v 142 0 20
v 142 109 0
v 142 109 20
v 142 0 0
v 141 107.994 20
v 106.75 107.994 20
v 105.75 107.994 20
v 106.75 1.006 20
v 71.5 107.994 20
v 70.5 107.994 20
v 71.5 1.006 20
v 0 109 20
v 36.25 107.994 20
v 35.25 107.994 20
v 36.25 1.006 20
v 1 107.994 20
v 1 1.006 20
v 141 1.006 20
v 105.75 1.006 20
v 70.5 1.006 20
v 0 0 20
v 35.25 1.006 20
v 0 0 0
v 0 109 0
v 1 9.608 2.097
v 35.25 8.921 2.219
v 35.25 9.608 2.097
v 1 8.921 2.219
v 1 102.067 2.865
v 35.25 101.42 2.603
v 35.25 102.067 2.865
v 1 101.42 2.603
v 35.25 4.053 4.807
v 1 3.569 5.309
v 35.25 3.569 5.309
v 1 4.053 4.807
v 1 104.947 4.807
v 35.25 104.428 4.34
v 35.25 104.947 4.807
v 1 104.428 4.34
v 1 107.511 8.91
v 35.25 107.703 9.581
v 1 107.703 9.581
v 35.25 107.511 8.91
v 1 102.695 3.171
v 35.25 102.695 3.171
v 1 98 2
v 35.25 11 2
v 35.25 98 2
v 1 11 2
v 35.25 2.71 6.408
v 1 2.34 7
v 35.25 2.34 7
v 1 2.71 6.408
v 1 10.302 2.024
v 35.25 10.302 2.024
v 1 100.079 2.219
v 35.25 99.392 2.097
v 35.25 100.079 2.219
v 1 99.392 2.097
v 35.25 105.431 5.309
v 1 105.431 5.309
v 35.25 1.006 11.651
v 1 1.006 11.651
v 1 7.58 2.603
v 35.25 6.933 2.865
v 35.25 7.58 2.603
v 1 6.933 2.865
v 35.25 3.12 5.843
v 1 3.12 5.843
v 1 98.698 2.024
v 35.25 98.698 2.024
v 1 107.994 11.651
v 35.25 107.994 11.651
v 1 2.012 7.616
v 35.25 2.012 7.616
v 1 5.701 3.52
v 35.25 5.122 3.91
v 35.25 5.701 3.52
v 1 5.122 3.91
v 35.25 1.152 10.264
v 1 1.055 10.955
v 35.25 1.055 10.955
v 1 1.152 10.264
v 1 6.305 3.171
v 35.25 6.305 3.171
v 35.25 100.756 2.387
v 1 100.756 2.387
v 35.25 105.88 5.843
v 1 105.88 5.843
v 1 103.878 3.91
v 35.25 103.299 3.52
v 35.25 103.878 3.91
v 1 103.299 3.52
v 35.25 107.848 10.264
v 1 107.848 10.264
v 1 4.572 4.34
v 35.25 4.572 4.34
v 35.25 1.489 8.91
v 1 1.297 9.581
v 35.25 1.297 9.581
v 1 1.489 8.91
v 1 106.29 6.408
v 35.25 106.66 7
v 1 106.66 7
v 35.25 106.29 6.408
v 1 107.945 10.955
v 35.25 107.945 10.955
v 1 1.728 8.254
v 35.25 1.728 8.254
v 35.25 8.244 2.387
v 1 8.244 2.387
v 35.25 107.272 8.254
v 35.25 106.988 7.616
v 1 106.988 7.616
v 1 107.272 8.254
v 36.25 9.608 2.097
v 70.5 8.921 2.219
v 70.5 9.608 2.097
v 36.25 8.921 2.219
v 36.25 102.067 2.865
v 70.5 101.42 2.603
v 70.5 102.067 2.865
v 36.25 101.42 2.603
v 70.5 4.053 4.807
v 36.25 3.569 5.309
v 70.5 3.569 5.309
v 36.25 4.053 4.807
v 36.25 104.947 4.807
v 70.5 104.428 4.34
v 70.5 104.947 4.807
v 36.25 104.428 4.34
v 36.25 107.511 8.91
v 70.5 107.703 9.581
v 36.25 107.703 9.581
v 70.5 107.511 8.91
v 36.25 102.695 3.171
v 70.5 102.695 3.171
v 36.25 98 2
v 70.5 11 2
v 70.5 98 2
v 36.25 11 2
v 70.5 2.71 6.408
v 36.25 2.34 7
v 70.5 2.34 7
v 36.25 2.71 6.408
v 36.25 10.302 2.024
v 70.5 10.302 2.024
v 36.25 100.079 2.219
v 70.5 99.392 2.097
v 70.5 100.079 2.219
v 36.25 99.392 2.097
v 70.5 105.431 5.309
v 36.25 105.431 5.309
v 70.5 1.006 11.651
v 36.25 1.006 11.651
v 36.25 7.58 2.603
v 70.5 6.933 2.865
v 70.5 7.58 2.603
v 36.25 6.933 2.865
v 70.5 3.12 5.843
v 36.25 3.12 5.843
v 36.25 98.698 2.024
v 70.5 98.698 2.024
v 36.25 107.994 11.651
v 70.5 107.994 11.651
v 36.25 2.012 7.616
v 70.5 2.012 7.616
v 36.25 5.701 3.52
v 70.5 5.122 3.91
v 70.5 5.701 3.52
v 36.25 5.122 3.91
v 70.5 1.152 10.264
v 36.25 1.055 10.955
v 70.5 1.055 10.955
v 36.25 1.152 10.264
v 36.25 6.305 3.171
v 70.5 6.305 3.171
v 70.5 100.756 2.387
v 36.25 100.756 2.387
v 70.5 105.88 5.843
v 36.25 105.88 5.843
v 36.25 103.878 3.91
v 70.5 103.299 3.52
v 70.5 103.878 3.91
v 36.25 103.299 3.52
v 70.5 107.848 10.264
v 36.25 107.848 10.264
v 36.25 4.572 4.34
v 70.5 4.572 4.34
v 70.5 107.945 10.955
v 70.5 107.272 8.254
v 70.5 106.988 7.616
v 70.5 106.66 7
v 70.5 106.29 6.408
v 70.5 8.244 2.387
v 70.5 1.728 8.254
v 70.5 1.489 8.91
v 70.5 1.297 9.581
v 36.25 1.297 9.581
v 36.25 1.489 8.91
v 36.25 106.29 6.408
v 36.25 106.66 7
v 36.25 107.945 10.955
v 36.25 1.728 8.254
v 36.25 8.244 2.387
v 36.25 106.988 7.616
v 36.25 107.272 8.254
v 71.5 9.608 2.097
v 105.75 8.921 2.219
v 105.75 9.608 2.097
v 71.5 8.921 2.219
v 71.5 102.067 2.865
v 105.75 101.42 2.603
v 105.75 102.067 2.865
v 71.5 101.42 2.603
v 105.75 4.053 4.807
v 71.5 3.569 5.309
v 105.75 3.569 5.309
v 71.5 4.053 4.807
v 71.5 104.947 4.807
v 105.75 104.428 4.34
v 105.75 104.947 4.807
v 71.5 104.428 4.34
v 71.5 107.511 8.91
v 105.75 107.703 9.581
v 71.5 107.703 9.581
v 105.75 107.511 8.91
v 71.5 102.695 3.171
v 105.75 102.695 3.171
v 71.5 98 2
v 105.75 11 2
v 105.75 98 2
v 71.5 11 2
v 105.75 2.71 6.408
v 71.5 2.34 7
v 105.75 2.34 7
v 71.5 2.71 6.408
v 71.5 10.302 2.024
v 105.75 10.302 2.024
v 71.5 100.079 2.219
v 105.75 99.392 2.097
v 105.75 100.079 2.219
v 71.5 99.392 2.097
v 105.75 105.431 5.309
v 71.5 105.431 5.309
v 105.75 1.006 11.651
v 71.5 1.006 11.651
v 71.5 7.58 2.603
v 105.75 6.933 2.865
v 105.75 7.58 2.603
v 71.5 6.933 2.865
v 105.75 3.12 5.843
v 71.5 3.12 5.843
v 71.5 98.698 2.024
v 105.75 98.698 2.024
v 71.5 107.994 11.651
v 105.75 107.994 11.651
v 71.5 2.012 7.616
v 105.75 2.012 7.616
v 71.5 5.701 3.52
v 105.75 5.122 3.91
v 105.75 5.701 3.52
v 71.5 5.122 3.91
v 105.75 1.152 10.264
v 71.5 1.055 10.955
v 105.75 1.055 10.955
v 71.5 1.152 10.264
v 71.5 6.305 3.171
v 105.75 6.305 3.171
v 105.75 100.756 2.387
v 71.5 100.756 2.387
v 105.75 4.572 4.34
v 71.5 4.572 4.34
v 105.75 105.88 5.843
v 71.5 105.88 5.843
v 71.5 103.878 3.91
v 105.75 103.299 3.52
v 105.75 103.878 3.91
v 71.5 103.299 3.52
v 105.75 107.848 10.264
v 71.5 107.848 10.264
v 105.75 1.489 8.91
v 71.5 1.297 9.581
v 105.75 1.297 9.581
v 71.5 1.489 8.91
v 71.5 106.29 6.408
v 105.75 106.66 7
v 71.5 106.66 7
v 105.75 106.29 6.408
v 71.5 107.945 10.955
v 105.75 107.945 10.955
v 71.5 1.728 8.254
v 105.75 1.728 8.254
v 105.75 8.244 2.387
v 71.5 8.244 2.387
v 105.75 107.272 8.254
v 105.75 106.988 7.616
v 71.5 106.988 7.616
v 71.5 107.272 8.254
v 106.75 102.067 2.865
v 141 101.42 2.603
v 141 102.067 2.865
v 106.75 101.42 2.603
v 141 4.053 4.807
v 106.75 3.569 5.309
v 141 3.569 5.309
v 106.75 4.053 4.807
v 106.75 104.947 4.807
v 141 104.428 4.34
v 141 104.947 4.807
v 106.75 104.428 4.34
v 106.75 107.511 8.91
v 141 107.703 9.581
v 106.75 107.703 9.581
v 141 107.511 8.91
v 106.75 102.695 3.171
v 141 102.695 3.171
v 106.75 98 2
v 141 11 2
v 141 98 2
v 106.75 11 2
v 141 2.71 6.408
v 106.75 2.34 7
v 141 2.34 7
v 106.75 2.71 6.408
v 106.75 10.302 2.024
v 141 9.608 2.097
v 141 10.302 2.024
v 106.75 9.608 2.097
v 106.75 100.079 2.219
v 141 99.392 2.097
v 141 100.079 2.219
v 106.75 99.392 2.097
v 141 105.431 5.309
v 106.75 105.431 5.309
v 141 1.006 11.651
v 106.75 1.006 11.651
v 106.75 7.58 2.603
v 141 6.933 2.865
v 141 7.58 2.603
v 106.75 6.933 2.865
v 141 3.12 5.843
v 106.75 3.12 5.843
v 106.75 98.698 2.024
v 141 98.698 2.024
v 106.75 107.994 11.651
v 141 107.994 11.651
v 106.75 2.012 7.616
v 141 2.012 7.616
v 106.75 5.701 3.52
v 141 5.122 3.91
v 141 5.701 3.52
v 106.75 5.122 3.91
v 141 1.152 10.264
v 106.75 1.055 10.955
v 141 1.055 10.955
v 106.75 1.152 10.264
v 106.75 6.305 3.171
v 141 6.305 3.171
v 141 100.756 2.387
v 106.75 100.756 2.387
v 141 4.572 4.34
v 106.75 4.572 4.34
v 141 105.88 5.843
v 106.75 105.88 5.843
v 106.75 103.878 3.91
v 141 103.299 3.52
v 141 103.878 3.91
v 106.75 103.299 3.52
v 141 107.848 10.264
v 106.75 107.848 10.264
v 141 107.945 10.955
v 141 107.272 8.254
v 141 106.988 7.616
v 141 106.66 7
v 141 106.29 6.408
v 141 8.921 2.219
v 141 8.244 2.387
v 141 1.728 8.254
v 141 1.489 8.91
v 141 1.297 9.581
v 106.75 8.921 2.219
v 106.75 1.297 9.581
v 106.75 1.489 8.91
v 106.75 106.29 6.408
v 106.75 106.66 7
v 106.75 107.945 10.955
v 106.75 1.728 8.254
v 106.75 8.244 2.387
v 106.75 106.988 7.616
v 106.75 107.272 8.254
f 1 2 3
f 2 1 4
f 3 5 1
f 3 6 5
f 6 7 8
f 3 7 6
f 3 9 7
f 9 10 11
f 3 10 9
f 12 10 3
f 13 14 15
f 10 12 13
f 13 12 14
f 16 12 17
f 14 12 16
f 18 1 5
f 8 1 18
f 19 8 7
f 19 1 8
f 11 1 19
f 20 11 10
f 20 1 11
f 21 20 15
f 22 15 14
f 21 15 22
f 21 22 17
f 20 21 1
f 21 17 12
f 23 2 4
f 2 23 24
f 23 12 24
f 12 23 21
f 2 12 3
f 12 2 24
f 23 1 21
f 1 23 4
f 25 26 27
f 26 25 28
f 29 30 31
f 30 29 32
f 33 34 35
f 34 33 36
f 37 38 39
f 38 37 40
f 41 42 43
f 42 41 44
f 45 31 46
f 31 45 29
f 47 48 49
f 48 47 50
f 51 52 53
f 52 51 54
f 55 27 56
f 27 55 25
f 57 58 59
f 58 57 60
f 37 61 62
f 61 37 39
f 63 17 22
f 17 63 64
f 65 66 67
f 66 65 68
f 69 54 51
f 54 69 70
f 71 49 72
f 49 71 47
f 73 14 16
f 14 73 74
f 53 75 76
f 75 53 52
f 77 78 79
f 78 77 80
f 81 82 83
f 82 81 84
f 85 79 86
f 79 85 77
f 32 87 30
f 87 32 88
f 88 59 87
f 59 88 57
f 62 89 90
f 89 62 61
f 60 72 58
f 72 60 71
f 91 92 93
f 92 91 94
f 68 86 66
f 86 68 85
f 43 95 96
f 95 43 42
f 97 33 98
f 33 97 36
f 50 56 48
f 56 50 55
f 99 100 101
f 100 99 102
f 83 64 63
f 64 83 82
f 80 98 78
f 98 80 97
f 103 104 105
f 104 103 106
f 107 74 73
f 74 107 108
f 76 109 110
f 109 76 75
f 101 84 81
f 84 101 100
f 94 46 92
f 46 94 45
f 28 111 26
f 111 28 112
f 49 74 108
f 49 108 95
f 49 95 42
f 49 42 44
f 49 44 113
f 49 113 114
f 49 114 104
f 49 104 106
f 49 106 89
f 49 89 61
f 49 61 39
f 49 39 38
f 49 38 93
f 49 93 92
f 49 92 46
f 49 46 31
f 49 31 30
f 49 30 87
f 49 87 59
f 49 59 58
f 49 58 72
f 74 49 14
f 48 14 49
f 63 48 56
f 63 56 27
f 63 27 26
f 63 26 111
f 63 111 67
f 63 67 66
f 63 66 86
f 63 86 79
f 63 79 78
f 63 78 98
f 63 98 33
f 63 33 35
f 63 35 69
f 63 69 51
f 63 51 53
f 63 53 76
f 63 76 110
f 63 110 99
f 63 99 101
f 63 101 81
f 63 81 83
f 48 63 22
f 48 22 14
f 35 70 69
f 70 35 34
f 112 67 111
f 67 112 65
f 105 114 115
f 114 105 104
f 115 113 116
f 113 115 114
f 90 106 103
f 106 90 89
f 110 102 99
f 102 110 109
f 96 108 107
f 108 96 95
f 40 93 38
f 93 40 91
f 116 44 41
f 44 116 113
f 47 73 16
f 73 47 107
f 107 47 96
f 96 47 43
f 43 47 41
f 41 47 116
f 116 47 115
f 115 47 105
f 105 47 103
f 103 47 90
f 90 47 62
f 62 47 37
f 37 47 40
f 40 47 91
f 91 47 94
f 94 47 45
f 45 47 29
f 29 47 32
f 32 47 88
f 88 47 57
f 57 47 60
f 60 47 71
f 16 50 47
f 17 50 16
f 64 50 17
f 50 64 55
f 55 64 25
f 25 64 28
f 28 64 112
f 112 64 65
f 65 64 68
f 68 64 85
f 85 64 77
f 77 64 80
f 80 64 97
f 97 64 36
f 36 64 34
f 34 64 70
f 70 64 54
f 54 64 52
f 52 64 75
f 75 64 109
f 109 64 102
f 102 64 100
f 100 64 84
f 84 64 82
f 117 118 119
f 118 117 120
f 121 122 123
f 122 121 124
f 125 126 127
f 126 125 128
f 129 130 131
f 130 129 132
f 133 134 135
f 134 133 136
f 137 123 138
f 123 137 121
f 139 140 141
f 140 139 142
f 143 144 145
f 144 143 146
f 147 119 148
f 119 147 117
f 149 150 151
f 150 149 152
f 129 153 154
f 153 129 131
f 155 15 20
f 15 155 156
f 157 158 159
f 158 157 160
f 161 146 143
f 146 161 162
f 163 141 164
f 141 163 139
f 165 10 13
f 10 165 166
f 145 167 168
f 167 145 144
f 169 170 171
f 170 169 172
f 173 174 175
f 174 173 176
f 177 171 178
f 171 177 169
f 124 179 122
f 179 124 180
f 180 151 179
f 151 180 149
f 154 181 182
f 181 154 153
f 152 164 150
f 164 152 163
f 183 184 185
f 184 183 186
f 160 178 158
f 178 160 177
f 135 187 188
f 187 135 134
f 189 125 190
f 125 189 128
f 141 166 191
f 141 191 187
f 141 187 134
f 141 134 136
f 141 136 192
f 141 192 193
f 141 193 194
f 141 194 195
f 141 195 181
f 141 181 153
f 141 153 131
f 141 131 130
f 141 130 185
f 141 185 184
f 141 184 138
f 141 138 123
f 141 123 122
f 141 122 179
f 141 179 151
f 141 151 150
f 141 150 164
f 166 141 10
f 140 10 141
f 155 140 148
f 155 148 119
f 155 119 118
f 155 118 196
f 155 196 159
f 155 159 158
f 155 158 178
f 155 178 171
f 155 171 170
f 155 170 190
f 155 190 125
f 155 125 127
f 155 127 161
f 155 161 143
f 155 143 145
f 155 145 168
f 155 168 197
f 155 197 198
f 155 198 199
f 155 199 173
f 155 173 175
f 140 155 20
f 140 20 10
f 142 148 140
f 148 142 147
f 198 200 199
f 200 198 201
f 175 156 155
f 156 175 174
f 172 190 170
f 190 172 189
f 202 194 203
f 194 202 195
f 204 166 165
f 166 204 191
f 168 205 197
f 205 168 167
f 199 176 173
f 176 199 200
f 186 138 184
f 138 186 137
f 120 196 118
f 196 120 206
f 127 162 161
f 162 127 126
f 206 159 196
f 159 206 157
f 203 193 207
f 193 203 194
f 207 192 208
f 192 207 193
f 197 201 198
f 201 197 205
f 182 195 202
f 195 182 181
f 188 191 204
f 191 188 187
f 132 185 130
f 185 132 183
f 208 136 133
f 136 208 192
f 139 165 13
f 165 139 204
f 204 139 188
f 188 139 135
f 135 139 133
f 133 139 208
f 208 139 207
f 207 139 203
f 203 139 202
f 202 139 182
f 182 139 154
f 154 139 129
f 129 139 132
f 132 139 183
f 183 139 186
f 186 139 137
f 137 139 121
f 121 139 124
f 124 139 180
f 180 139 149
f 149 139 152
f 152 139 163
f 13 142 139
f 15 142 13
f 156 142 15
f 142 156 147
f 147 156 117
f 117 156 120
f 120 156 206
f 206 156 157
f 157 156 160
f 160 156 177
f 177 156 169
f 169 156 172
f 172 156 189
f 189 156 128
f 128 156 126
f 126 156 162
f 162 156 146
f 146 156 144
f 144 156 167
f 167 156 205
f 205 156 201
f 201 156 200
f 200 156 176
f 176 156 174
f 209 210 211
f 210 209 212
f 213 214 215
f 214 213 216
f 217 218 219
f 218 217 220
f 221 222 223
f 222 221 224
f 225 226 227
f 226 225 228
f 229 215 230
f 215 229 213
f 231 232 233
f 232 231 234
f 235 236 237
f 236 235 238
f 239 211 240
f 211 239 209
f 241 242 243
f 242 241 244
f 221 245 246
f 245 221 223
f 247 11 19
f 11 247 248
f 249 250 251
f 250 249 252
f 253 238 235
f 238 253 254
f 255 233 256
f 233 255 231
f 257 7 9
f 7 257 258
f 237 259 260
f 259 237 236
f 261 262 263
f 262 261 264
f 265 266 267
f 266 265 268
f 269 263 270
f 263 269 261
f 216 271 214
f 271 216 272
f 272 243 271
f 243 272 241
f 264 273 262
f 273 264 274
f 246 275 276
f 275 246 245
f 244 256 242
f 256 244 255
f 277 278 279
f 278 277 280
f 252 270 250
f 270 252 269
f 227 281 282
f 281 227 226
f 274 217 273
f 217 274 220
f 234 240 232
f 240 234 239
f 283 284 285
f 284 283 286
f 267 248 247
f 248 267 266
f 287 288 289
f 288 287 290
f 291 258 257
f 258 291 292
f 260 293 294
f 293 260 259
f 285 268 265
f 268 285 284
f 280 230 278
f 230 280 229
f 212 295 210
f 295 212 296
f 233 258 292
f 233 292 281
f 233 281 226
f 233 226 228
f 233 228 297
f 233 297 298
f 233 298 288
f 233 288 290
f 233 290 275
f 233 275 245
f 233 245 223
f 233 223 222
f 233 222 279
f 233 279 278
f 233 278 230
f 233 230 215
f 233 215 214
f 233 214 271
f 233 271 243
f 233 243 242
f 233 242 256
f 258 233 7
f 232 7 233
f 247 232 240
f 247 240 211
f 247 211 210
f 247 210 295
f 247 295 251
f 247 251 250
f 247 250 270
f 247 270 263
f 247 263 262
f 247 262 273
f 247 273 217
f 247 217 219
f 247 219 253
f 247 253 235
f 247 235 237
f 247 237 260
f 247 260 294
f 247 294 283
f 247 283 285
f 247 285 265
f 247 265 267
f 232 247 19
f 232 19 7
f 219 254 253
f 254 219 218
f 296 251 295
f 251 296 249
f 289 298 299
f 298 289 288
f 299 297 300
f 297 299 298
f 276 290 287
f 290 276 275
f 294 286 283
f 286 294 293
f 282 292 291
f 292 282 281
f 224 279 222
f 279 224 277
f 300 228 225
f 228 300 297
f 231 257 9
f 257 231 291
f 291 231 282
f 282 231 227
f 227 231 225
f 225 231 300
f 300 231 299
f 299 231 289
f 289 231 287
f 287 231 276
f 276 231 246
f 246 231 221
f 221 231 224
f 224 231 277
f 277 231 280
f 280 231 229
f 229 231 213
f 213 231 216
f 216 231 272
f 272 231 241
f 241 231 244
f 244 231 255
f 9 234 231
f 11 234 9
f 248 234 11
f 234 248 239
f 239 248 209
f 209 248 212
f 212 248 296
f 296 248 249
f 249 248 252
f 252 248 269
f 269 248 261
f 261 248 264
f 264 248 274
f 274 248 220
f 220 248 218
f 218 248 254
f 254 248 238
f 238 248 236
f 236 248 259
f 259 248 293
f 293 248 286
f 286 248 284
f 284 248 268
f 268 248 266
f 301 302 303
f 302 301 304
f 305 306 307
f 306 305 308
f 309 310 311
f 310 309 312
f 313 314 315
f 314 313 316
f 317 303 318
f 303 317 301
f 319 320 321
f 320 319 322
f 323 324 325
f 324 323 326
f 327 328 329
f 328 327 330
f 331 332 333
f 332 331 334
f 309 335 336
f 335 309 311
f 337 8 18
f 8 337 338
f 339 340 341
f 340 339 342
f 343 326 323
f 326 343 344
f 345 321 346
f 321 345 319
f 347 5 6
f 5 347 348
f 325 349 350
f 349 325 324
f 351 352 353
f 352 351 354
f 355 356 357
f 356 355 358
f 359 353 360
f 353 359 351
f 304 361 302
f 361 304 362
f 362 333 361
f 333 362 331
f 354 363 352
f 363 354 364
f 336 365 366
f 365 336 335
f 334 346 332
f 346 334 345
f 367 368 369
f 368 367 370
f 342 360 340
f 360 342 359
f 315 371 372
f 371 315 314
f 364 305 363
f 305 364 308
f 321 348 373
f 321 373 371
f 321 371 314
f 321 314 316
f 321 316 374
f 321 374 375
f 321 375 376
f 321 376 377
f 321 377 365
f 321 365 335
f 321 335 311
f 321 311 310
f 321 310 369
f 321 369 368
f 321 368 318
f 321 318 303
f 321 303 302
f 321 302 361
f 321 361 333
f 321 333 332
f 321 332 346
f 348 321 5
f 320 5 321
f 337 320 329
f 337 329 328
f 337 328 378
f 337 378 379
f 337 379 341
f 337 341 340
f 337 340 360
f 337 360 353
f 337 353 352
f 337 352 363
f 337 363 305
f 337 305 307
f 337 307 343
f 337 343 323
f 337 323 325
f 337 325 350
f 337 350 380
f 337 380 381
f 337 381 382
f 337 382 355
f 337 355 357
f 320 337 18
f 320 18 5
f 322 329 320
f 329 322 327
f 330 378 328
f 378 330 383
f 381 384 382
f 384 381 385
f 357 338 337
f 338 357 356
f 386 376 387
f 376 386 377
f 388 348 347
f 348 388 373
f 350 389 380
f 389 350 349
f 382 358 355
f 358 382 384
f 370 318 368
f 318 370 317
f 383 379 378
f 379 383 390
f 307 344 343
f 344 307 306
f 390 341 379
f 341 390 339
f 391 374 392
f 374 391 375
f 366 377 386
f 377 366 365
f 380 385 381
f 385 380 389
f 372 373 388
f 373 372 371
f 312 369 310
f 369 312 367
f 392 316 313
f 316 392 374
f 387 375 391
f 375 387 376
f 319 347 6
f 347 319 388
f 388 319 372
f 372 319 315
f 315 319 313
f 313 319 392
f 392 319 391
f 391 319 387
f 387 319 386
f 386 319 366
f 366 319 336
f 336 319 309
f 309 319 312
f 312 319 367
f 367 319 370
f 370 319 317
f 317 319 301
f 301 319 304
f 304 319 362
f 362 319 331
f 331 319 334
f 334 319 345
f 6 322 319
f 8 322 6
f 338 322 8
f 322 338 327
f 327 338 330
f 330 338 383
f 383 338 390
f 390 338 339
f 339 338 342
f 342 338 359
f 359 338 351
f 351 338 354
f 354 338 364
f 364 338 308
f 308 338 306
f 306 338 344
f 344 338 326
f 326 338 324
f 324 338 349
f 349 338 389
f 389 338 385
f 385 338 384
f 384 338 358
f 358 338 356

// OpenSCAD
// file: ../lib/roundedcube.scad
//
// Dan Upshaw built this module and graciously granted his permission
// for inclusion in this repository.
// The code itself can be found at
// https://danielupshaw.com/openscad-rounded-corners/
// Higher definition curves
$fs = 0.01;

module roundedcube(size = [1, 1, 1], center = false, radius = 0.5, apply_to = "all") {
	// If single value, convert to [x, y, z] vector
	size = (size[0] == undef) ? [size, size, size] : size;

	translate_min = radius;
	translate_xmax = size[0] - radius;
	translate_ymax = size[1] - radius;
	translate_zmax = size[2] - radius;

	diameter = radius * 2;

	module build_point(type = "sphere", rotate = [0, 0, 0]) {
		if (type == "sphere") {
			sphere(r = radius);
		} else if (type == "cylinder") {
			rotate(a = rotate)
			cylinder(h = diameter, r = radius, center = true, $fn=90);
		}
	}

	obj_translate = (center == false) ?
		[0, 0, 0] : [
			-(size[0] / 2),
			-(size[1] / 2),
			-(size[2] / 2)
		];

	translate(v = obj_translate) {
		hull() {
			for (translate_x = [translate_min, translate_xmax]) {
				x_at = (translate_x == translate_min) ? "min" : "max";
				for (translate_y = [translate_min, translate_ymax]) {
					y_at = (translate_y == translate_min) ? "min" : "max";
					for (translate_z = [translate_min, translate_zmax]) {
						z_at = (translate_z == translate_min) ? "min" : "max";

						translate(v = [translate_x, translate_y, translate_z])
						if (
							(apply_to == "all") ||
							(apply_to == "xmin" && x_at == "min") || (apply_to == "xmax" && x_at == "max") ||
							(apply_to == "ymin" && y_at == "min") || (apply_to == "ymax" && y_at == "max") ||
							(apply_to == "zmin" && z_at == "min") || (apply_to == "zmax" && z_at == "max")
						) {
							build_point("sphere");
						} else {
							rotate = 
								(apply_to == "xmin" || apply_to == "xmax" || apply_to == "x") ? [0, 90, 0] : (
								(apply_to == "ymin" || apply_to == "ymax" || apply_to == "y") ? [90, 90, 0] :
								[0, 0, 0]
							);
							build_point("cylinder", rotate);
						}
					}
				}
			}
		}
	}
}
// file: parameters.scad
//parameters
//thickness of box sides
wall = 2;

//width of cards, including sleeves and extra space
crdX = 70;

//length of cards including sleeves and extra space
crdY = 93;                  

//height of the entire pile of cards.  modify if you have more cards
crdZ = 18;

//how much of the main box is tapered to accommodate the lid
lidY = 25;

//the size of the taper
lidDiff = 0.75;

//The amount of "looseness" between the lid and the box on each side
lidSpacing = 0.25;

sideFontName="Impact";
sideFontSize=10;
sideFontLeftPadding=2;

//constant to avoid coincident faces.  don't change this
_min=0.1;

//calculated values
trayX = crdX+(2*wall);
trayY = crdY+(2*wall);
trayZ = crdZ+(2*wall);

// values for card tray
crdTrayZ = 23 + wall;
trayNotch = 40;
trayFontSize = 16;

// non-card well
wellX = 142;

lvl1Z = 12;

// places discs
discR = 60;
discPadding = 2;
discHolder = 3;
discBrim = 2;
discNotch = 70;
holderY = (2 * discR) + (2 * discHolder) + (2 * discPadding) + (2 * discBrim);

//miscellaneous tray
boxSize = 243;
miscBottom = 1;
miscX = wellX;
miscY = boxSize - holderY;
miscZ = lvl1Z;
miscWall=1;

//blood tokens tray
// same basic size as the places disc holder
btWall = 1;
btBottom = 2;
btWellDepth = 18;
btZ = btBottom + btWellDepth;
btWellX = (wellX - (5*btWall))/4;

//blood tokens ks
// same basic size as the miscellaneous tray
btkWall = 1;
btkBottom = 2;
btkWellDepth = 18;
btkZ = btkBottom + btkWellDepth;
btkWellX = (wellX - (5*btWall))/4;
// main file
include <parameters.scad>;
use <../lib/roundedcube.scad>

difference(){

    cube([wellX,miscY,btkZ]);

    translate([btWall,btWall,btBottom])
        btWell();   

    translate([(btWall*2) + btWellX,btWall,btBottom])
        btWell();   

    translate([(btWall*3) + (2*btWellX),btWall,btBottom])
        btWell();   

    translate([(btWall*4) + (3*btWellX),btWall,btBottom])
        btWell();   

}

module btWell() {
    color("red")
    roundedcube([btWellX,miscY-(2*btWall),40], false, 10 ,"x");
}
